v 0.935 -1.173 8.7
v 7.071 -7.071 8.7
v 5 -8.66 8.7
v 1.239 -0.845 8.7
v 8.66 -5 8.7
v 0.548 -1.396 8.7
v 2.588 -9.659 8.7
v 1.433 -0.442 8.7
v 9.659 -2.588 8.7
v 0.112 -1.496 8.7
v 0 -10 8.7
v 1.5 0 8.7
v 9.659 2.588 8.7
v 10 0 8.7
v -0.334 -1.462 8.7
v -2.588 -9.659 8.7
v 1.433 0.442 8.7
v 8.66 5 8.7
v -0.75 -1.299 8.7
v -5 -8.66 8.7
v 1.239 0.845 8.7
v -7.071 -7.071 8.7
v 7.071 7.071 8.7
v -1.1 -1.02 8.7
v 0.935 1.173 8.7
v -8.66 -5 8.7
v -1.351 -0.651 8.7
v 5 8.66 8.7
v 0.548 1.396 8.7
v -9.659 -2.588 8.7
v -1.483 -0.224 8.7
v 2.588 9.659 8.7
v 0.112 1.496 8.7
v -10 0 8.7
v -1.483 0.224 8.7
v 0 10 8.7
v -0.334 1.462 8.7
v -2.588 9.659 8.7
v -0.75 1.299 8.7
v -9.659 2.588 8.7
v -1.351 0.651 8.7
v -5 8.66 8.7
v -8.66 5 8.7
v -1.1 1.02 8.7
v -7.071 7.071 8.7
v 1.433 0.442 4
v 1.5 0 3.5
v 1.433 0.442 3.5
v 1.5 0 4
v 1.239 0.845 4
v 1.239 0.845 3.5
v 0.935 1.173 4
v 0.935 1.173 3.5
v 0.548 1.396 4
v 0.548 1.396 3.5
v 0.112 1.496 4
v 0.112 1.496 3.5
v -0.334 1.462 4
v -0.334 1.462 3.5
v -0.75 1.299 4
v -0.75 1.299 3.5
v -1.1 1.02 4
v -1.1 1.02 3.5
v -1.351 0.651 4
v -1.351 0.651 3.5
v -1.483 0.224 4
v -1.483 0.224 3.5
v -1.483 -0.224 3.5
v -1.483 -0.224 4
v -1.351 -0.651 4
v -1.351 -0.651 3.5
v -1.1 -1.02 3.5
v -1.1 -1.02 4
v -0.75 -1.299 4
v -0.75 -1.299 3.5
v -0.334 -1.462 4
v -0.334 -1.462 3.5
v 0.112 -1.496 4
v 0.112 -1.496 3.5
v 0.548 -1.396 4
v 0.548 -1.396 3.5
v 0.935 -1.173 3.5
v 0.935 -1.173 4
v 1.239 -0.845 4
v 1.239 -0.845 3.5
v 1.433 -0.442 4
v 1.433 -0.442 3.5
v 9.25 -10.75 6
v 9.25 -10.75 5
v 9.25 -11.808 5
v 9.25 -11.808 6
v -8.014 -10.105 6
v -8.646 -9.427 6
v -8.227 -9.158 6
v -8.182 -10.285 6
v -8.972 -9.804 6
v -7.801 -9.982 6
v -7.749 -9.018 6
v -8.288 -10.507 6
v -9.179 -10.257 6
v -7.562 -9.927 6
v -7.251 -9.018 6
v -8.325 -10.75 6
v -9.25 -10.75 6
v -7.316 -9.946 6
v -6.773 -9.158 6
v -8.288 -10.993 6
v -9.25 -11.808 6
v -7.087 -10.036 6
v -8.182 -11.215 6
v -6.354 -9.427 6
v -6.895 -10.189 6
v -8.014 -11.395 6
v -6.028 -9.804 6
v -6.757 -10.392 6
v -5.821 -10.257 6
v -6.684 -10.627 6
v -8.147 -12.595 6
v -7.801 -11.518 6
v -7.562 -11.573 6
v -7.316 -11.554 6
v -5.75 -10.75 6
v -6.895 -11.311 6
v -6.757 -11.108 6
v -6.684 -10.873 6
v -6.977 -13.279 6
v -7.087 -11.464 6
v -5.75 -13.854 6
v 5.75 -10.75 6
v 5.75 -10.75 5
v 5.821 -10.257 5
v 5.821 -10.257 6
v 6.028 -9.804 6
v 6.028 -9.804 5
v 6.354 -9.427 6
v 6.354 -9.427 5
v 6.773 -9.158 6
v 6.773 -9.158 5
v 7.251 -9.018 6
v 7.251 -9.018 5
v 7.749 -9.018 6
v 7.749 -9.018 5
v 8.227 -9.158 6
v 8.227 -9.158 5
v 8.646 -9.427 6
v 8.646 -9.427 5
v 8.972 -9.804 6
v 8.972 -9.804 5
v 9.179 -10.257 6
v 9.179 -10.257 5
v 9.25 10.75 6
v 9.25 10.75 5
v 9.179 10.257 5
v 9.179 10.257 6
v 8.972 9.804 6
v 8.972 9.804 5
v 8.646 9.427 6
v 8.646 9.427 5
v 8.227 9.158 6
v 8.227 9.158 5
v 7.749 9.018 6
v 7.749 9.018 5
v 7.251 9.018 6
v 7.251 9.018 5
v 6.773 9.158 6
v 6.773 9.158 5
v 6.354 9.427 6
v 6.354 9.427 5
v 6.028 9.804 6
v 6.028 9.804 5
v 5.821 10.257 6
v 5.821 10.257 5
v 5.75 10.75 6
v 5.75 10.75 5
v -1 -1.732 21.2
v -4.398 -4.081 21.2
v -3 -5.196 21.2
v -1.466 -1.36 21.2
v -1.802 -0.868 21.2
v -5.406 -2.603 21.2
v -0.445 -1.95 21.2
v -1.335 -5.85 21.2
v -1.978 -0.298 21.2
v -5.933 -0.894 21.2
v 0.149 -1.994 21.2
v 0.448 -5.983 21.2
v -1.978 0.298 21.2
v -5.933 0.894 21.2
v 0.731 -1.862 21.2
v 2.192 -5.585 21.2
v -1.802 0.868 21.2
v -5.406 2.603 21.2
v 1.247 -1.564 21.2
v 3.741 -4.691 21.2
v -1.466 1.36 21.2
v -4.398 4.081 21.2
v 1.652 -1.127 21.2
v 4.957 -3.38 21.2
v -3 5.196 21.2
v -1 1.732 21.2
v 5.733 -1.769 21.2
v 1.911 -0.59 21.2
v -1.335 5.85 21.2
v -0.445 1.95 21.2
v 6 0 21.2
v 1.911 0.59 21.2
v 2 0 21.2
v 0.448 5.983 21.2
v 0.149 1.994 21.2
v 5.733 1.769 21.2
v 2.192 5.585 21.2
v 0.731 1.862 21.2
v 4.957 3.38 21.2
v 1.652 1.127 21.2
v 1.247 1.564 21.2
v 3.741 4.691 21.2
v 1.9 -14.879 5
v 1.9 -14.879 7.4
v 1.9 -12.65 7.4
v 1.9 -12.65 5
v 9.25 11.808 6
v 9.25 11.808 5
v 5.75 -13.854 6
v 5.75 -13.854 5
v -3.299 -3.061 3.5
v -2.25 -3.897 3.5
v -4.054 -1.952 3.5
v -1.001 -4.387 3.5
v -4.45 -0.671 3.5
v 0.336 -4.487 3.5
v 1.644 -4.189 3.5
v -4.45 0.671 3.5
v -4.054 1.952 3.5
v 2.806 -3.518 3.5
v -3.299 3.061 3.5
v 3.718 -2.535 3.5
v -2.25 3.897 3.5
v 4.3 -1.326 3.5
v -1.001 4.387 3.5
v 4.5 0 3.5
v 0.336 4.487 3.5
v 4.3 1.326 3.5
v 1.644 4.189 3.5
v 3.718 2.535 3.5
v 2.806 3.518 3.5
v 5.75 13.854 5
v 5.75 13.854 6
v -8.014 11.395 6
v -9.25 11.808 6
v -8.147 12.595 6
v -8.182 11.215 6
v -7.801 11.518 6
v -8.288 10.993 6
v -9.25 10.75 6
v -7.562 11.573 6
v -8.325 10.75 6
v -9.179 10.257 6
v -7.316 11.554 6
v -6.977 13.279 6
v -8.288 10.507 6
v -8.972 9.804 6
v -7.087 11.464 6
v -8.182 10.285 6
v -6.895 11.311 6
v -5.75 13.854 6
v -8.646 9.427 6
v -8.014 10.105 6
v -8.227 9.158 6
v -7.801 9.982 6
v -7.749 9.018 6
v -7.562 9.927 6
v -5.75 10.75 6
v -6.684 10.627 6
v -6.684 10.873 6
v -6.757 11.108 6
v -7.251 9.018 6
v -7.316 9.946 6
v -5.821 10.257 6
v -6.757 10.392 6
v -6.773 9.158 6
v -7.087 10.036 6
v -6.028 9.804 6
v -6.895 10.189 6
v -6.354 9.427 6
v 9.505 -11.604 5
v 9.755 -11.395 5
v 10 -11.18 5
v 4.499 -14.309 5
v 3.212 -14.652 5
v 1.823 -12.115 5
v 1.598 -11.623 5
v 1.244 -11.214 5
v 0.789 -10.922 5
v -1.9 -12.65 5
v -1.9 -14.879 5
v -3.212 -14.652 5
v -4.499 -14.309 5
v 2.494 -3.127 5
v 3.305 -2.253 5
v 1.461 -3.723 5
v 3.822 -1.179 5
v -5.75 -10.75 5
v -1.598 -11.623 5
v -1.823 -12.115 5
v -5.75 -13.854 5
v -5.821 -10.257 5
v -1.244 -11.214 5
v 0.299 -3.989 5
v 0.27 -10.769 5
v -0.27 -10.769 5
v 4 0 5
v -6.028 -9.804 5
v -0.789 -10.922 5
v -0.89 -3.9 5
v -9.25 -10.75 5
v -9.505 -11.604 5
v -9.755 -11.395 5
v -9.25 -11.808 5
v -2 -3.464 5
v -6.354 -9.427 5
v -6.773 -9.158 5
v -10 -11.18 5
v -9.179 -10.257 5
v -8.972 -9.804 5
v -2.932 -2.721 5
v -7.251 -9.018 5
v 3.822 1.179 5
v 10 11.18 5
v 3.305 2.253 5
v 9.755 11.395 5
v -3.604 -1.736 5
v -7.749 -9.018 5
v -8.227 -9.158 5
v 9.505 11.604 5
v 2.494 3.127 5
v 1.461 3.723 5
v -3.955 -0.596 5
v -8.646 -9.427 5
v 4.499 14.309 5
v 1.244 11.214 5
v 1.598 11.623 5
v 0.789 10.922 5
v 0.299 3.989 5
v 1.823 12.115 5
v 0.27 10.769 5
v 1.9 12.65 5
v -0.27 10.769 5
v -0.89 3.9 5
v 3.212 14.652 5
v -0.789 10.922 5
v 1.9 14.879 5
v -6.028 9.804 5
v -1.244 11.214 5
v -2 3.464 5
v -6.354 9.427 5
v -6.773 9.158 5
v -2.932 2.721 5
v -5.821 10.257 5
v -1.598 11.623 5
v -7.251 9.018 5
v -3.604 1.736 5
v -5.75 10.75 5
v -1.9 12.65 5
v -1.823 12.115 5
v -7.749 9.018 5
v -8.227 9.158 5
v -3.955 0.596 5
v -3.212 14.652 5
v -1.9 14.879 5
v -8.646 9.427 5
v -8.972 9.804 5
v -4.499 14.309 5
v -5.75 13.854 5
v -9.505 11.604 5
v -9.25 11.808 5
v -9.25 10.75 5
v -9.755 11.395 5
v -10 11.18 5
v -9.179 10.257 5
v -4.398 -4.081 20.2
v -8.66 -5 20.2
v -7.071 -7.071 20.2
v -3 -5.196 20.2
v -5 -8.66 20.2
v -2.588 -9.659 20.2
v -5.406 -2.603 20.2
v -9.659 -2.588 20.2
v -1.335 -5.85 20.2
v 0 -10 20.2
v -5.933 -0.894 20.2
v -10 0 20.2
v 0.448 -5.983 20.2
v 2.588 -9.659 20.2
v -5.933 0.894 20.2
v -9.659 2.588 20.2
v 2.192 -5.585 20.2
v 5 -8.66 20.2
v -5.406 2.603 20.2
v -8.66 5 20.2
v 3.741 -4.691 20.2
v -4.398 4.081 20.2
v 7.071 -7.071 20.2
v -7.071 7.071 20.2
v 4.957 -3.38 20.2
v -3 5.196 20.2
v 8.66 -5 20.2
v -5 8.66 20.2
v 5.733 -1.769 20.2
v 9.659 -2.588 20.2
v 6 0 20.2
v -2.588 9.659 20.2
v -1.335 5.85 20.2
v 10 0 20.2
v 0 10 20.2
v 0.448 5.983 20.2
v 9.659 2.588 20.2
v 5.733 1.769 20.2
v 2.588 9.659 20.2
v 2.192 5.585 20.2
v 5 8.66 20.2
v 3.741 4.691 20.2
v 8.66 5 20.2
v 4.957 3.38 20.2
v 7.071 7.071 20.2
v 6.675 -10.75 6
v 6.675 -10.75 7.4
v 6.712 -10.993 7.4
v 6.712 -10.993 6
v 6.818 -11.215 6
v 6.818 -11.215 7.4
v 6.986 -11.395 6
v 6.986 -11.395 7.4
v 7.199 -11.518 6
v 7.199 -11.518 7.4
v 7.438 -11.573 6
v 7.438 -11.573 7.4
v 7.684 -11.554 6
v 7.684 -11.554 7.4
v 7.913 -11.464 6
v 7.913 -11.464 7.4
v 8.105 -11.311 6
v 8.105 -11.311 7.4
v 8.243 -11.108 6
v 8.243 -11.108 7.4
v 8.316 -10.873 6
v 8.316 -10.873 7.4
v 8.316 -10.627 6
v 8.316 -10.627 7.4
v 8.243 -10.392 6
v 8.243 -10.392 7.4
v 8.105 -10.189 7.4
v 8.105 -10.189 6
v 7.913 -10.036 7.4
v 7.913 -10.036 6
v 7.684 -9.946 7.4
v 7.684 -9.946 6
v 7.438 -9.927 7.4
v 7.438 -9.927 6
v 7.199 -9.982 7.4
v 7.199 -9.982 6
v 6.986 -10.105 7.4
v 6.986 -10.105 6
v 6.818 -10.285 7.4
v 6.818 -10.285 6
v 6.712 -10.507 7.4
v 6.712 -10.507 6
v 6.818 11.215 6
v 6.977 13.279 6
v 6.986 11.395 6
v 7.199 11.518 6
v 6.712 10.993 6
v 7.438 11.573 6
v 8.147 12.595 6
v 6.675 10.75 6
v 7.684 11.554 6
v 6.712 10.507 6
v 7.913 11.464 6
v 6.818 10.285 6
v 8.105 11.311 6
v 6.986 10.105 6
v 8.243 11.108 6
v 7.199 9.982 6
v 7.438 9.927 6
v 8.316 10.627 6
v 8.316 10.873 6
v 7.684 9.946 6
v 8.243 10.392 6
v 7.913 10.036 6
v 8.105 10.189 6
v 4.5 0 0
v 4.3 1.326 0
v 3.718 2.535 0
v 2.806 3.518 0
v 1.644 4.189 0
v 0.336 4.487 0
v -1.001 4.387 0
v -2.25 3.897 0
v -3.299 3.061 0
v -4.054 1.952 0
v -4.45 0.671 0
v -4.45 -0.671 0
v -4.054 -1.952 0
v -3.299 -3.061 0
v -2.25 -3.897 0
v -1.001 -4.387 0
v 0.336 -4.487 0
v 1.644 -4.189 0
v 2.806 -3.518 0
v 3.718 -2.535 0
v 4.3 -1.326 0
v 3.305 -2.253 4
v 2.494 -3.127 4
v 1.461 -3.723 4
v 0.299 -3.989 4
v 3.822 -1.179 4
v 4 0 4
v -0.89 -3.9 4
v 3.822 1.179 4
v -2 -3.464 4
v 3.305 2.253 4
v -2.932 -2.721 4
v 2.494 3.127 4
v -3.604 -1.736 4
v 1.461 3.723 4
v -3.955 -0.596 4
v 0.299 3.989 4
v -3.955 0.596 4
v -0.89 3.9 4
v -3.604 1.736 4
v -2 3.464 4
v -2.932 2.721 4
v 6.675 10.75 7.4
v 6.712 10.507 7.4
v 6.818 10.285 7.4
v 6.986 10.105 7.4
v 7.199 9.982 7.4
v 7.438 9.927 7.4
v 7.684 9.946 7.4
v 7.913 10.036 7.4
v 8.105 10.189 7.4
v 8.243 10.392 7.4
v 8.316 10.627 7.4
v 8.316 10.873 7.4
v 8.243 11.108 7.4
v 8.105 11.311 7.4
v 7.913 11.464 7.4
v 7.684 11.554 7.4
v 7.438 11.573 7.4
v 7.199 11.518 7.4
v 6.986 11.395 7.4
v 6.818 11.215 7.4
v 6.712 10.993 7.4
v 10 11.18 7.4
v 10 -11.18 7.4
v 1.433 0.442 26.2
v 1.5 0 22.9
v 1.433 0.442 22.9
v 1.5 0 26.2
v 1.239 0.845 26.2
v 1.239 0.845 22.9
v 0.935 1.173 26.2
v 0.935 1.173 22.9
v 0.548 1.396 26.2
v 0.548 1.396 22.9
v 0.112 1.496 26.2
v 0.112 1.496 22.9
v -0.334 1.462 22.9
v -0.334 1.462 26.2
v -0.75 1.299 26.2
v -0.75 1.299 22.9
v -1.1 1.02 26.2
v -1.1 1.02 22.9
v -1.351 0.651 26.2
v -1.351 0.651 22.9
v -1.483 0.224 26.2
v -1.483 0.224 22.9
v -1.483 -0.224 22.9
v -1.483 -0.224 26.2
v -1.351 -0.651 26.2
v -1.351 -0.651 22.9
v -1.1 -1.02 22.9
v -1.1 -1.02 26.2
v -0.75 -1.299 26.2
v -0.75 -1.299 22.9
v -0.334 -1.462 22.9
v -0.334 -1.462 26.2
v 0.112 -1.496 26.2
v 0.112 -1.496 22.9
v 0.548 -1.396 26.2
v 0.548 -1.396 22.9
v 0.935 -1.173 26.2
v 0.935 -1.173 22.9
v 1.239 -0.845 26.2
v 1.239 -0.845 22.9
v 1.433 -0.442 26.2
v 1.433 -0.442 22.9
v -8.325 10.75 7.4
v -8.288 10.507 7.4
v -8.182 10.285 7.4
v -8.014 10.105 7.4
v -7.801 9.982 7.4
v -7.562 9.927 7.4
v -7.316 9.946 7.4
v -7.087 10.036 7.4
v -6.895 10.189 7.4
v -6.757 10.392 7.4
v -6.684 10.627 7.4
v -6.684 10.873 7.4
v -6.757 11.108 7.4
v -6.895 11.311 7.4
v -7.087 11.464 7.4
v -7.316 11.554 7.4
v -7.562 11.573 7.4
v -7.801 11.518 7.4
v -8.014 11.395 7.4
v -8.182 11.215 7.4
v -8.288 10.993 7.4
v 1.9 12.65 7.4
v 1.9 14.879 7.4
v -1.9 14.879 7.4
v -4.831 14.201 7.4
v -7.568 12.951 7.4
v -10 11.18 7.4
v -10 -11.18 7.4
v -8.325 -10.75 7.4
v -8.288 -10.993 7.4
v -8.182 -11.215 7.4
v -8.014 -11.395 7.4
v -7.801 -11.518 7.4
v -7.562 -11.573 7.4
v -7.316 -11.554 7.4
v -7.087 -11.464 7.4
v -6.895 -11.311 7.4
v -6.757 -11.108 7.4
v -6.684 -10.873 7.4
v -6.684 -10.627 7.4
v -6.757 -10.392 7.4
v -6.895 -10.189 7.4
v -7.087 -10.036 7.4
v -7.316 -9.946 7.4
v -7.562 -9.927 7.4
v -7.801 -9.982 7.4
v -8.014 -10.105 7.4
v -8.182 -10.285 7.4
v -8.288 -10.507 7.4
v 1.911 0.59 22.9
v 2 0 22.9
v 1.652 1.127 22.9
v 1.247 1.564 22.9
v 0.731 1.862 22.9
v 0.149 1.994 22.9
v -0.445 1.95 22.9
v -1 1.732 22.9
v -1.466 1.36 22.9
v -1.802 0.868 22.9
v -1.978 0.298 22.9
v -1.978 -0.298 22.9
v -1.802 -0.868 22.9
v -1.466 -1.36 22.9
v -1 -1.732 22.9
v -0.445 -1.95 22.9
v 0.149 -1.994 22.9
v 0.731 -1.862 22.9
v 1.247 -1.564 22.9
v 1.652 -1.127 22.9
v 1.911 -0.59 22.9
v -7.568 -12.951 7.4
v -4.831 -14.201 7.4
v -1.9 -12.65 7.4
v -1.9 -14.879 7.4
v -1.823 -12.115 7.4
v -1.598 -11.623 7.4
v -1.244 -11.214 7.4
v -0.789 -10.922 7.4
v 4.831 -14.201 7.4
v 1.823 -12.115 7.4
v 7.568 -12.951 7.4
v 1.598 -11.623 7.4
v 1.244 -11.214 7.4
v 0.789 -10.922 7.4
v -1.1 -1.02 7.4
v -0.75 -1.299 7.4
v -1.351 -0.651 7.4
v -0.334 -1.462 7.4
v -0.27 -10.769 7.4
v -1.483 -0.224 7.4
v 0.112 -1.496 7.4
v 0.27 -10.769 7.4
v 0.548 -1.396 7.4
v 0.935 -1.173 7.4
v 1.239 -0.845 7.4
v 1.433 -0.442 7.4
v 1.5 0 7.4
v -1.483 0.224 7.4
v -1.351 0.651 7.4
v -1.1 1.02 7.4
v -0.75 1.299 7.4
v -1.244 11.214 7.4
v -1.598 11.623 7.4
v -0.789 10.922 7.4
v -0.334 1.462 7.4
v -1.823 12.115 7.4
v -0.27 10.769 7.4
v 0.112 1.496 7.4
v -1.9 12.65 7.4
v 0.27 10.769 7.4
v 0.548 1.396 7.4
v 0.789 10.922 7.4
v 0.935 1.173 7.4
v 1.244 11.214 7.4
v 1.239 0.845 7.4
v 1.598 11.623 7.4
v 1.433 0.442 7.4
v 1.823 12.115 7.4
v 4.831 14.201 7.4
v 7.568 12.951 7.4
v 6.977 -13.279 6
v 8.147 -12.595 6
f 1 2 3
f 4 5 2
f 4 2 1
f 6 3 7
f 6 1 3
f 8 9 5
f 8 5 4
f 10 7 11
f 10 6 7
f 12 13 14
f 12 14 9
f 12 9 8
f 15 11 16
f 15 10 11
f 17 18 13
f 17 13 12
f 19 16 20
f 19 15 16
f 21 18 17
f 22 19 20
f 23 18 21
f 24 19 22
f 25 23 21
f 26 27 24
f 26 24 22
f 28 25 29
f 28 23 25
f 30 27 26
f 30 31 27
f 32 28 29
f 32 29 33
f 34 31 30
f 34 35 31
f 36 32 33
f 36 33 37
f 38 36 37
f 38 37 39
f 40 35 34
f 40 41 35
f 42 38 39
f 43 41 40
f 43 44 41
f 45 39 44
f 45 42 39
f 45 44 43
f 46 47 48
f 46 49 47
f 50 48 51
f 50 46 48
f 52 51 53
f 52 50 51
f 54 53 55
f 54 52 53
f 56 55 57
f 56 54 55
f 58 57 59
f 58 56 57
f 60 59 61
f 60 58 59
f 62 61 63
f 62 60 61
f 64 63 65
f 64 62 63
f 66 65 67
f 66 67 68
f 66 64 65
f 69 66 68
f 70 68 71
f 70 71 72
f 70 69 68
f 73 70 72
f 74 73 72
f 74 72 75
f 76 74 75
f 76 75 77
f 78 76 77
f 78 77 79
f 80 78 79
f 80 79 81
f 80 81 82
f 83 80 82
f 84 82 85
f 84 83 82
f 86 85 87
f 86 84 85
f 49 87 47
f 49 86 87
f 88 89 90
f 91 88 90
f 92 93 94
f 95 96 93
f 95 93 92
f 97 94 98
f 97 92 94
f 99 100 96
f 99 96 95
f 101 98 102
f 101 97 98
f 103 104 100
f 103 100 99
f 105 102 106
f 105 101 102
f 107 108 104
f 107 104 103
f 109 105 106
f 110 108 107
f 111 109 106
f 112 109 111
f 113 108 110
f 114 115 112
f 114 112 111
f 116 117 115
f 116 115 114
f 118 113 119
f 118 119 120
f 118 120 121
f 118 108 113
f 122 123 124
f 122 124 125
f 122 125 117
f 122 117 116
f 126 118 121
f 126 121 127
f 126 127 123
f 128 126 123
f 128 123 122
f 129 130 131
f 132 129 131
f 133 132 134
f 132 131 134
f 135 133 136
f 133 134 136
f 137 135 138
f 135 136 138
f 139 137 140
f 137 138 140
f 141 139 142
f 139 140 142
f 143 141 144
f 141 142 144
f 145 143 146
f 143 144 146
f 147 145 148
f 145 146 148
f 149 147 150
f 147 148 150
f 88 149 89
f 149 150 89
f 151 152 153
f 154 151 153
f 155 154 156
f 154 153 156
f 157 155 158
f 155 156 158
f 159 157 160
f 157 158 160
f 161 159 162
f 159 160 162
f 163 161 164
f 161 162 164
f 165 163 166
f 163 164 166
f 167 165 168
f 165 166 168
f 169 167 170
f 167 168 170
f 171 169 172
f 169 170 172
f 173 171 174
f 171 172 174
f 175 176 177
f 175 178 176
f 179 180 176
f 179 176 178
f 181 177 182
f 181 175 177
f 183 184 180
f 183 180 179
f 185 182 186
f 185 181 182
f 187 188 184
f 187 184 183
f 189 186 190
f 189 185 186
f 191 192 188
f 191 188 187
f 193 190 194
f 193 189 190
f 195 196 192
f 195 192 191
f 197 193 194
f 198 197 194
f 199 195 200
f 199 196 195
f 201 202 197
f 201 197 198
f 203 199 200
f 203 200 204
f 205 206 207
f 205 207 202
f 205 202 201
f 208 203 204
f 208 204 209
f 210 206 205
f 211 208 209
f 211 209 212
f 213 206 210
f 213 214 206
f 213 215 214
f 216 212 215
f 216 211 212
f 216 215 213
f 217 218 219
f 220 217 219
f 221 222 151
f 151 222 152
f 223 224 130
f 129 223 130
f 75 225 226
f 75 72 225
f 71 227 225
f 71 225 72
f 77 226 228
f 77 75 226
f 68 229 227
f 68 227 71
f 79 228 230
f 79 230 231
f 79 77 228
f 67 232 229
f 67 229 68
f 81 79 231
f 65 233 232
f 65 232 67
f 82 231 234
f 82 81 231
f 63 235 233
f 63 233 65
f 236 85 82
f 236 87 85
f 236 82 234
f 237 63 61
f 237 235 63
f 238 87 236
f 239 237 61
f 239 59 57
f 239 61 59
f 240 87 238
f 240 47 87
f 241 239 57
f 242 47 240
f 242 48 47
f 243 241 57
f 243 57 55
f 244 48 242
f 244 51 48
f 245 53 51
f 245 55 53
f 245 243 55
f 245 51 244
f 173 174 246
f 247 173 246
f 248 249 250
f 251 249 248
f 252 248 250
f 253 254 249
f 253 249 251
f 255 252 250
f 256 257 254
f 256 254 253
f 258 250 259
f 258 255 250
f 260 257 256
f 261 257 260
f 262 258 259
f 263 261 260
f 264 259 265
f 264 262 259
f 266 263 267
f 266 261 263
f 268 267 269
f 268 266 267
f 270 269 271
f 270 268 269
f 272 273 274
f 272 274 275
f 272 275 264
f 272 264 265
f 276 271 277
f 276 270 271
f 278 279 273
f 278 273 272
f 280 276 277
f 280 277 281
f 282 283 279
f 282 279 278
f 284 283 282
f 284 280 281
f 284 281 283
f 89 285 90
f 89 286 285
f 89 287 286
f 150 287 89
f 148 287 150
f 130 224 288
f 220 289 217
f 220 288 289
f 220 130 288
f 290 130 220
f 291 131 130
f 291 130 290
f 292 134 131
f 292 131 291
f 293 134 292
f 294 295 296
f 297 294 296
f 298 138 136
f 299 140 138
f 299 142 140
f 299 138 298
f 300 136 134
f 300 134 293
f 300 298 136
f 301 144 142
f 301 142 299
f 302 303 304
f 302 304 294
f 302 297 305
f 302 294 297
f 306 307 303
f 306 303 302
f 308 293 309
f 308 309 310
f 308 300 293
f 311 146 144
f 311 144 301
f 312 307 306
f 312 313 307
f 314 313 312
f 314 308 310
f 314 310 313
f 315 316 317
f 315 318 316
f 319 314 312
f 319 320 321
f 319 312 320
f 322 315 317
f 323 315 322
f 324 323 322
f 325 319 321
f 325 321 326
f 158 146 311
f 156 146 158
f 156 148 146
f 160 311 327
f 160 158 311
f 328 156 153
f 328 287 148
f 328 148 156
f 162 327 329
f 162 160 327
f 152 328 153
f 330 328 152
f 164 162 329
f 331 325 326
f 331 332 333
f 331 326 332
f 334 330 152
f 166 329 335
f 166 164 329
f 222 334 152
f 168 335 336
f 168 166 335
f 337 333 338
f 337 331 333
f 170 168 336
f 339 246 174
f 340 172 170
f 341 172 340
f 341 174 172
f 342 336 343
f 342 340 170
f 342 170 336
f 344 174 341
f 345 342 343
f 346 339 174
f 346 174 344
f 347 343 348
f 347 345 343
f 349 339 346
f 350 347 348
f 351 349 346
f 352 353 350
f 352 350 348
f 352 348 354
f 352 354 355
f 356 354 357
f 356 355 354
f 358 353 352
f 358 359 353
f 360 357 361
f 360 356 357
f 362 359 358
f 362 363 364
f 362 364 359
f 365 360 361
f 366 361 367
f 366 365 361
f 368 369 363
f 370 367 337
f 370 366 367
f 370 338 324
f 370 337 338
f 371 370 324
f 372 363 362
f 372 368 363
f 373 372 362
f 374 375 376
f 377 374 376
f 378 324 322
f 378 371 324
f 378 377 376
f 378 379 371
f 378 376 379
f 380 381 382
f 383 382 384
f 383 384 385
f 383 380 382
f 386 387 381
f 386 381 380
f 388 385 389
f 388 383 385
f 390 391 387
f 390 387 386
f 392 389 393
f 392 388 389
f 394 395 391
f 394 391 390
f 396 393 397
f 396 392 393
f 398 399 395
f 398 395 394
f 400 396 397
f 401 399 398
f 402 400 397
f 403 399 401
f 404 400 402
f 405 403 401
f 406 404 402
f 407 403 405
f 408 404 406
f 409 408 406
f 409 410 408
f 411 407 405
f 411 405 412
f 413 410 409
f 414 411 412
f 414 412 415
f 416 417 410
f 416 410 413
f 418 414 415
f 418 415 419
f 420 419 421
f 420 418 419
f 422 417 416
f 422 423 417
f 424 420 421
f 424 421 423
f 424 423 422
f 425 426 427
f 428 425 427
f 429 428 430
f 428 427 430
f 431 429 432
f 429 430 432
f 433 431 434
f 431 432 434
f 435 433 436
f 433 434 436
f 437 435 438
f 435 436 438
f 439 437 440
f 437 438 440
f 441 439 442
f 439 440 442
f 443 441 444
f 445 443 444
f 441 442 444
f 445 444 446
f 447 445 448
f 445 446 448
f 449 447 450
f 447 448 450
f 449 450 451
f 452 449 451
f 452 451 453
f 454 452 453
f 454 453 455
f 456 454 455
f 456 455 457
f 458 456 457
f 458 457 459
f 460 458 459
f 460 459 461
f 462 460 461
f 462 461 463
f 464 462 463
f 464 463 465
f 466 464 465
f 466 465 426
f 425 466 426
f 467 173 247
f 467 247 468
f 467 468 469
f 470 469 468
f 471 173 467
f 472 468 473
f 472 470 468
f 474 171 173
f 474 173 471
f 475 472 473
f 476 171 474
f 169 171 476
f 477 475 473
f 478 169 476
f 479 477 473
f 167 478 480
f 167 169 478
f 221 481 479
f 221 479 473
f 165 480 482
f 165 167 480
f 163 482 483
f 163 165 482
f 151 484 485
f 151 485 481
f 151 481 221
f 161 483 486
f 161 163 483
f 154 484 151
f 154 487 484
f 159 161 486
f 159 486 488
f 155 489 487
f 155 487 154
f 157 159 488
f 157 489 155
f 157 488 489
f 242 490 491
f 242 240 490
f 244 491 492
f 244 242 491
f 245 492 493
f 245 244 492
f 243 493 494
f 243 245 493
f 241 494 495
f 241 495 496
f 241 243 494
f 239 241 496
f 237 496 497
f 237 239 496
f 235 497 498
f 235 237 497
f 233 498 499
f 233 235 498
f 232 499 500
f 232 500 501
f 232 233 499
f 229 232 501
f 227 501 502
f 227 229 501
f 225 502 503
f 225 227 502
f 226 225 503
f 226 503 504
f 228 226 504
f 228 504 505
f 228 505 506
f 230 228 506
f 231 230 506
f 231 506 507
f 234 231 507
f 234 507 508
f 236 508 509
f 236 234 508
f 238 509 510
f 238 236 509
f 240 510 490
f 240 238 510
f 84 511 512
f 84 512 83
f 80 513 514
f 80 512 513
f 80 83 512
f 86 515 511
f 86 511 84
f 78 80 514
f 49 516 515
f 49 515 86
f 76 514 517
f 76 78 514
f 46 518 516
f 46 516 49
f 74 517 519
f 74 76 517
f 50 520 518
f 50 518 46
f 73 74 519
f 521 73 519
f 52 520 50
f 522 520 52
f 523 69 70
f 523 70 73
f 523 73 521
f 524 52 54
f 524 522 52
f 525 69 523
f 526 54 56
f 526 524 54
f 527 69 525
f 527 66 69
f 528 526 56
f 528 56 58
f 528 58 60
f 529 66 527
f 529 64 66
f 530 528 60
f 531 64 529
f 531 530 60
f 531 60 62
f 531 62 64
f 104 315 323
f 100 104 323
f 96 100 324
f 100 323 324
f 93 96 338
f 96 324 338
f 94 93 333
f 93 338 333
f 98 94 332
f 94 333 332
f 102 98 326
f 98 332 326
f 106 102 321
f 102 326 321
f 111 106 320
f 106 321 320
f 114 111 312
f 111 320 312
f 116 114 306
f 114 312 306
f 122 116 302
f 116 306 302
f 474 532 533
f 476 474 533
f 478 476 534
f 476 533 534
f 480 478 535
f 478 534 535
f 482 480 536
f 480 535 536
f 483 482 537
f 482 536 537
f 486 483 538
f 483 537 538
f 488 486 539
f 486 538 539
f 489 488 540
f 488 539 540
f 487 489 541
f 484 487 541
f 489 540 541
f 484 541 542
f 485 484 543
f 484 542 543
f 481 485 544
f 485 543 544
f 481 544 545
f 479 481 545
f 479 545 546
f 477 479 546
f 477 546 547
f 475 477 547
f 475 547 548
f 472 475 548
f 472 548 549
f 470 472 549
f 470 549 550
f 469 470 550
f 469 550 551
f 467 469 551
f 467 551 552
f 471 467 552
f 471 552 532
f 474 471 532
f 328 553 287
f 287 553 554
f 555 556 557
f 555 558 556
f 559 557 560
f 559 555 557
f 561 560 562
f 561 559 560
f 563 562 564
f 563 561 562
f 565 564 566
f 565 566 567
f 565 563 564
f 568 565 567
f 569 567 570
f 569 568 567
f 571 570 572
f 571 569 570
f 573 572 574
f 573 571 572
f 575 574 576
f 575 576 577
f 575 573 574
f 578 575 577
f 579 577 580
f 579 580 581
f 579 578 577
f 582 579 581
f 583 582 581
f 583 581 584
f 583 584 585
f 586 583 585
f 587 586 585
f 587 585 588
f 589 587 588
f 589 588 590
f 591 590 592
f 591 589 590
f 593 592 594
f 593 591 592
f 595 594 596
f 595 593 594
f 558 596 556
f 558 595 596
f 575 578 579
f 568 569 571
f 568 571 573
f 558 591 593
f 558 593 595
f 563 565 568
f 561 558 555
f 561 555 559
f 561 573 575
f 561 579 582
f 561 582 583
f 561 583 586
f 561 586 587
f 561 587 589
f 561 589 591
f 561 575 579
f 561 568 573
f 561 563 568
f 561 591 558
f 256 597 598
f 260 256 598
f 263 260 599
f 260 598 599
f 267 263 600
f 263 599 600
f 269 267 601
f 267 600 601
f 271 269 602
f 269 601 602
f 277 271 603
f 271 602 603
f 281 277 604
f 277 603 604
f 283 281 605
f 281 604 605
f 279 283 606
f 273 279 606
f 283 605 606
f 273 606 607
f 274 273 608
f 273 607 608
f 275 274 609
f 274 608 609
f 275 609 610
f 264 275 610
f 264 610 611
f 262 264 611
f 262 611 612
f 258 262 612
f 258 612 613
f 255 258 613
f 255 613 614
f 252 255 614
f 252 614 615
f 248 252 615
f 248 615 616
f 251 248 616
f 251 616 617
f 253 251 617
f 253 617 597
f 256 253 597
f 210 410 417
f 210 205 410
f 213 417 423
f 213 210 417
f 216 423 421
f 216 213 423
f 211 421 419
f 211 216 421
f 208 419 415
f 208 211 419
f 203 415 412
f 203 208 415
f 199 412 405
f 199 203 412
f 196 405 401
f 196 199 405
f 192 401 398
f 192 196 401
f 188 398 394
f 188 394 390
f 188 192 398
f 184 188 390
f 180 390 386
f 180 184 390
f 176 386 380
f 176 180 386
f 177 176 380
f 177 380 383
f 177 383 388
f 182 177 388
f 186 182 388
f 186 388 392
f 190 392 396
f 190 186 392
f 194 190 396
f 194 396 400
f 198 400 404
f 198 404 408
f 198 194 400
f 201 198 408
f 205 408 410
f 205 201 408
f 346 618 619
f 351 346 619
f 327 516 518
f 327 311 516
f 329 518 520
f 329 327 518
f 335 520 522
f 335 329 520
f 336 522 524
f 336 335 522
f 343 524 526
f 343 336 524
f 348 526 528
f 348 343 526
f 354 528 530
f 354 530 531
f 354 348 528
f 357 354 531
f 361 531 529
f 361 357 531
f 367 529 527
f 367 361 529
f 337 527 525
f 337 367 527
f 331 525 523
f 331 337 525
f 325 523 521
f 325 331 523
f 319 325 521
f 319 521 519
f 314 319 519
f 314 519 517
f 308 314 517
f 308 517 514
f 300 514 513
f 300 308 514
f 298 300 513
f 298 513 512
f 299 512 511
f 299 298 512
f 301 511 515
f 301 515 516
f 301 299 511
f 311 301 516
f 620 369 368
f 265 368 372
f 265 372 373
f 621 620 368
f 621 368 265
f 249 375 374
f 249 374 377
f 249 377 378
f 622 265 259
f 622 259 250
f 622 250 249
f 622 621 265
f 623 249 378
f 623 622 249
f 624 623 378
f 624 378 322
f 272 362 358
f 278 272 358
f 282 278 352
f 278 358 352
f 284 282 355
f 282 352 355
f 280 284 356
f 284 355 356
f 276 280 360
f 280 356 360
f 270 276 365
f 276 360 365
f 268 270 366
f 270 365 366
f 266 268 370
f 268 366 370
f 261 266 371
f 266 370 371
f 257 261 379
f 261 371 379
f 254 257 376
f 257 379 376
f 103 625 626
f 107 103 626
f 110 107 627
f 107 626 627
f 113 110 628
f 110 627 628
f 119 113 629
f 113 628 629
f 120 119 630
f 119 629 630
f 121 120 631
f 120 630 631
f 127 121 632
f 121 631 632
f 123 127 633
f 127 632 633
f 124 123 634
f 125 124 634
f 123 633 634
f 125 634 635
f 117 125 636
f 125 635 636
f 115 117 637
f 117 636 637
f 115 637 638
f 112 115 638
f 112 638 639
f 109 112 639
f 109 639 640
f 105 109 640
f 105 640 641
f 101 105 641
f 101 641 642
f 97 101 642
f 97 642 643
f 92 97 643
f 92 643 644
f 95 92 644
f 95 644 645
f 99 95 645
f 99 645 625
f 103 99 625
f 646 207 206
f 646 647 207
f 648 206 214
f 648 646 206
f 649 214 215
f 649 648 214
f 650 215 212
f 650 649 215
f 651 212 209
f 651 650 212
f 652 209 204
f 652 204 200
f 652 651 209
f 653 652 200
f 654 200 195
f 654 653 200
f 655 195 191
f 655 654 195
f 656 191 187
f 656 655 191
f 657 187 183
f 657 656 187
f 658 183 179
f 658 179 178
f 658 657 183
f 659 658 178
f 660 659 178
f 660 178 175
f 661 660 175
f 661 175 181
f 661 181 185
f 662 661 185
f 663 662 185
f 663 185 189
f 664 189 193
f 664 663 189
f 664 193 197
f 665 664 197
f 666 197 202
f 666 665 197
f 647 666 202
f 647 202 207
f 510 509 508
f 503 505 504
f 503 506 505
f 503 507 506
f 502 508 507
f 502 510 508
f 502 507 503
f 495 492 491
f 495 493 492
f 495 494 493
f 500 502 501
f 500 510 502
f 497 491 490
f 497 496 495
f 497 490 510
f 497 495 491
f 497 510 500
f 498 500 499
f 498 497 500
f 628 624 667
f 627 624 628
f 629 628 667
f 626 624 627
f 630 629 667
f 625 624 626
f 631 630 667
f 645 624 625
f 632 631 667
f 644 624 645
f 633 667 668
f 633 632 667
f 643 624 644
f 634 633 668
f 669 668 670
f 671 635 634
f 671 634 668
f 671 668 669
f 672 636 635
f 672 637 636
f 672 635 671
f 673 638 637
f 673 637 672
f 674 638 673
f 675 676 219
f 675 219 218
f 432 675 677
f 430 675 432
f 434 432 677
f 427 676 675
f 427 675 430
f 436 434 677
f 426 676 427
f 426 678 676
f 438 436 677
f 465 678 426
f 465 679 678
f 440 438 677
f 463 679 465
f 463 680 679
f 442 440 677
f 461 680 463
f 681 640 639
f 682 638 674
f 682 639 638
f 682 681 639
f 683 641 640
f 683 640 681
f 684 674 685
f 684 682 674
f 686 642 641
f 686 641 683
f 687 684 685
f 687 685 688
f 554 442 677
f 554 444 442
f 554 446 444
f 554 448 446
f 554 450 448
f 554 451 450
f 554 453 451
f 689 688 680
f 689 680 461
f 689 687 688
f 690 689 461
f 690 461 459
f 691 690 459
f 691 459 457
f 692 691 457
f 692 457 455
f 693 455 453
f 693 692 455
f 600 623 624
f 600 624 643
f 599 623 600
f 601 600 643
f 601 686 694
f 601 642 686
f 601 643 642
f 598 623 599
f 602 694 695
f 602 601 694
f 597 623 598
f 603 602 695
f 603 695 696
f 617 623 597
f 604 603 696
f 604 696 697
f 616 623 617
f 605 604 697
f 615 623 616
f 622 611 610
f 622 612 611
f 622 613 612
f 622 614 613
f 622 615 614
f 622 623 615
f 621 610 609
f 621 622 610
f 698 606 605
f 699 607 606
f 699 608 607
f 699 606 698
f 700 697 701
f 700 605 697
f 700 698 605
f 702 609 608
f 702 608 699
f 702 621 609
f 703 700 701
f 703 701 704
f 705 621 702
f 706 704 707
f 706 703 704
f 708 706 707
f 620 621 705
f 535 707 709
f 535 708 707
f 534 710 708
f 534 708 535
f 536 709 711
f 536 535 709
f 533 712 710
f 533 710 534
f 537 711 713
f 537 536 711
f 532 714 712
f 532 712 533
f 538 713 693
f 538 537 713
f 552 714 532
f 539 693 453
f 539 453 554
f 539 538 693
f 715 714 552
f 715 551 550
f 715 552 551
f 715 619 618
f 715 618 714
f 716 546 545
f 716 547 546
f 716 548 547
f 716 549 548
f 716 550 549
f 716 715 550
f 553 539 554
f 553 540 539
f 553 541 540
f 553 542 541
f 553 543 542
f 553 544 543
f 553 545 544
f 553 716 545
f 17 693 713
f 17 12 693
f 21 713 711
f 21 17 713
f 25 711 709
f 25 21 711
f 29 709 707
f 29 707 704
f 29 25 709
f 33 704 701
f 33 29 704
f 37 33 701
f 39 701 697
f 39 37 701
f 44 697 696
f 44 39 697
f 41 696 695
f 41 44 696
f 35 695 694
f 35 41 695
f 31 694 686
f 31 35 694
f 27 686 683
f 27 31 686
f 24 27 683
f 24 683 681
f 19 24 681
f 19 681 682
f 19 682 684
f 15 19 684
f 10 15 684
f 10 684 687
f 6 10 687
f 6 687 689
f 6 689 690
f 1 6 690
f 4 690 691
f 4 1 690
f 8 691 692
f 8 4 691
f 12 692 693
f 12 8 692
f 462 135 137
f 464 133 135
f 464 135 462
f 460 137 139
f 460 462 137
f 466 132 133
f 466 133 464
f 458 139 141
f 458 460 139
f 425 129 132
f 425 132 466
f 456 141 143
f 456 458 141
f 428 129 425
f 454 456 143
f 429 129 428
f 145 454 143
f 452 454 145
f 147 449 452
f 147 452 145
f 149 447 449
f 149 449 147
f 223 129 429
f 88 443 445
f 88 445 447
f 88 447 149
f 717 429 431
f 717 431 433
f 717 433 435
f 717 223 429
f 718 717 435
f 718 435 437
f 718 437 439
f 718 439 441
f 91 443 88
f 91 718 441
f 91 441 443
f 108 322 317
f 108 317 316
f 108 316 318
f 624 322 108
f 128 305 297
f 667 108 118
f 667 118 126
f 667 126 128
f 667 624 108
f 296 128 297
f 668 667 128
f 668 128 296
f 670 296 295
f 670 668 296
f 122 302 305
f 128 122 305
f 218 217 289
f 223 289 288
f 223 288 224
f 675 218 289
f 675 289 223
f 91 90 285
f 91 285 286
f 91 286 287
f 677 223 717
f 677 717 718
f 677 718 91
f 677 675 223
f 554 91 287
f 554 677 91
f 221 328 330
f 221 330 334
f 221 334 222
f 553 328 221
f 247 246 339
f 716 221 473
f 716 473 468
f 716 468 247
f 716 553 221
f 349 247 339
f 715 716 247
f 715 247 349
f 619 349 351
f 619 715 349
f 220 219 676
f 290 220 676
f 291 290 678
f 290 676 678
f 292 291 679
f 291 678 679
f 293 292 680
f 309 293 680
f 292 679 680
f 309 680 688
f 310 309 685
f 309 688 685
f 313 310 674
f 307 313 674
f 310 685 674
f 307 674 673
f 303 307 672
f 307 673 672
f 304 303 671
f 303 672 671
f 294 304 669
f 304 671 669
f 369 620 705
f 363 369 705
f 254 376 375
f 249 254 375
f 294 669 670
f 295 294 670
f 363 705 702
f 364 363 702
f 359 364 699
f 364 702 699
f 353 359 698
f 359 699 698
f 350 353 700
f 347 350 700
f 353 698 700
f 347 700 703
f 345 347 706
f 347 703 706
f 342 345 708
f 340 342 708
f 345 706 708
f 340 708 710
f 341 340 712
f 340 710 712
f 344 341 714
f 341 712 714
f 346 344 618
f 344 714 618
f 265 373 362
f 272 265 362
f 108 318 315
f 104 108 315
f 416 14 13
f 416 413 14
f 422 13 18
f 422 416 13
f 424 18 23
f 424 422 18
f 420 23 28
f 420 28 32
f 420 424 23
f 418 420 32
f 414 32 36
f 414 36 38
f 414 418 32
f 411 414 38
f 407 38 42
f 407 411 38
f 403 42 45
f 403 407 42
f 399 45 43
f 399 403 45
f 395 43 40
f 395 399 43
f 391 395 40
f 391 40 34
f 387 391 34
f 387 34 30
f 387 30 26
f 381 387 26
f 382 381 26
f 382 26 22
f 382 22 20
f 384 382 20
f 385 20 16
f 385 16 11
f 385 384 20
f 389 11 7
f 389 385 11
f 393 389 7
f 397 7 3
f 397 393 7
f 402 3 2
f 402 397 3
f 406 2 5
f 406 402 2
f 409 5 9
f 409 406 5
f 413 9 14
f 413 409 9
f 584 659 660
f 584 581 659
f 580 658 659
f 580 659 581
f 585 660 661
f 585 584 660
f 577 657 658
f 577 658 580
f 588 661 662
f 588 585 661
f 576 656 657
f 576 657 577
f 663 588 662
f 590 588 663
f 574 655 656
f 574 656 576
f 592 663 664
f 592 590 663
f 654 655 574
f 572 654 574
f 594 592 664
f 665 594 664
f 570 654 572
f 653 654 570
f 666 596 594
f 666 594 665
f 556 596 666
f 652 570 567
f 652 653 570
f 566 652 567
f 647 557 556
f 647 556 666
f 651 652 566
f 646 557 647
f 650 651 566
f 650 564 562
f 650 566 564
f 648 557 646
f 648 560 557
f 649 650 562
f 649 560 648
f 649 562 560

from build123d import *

# Parameters (mm, degrees)
SKETCH001_W     = 14.830339
SKETCH001_H     = 37.894496
SKETCH001_W_2   = 11.332046
SKETCH001_H_2   = 38.12416
POCKET_DEPTH    = 7.401
SKETCH002_R     = 0.825
POCKET001_DEPTH = 7.401
POCKET002_DEPTH = 1


with BuildPart() as part:
    # Sketch → Revolution (revolve)
    with BuildSketch(Plane.XZ):
        Polygon((0, 0), (4.5, 0), (4.5, 3.5), (1.5, 3.5), (1.5, 4), (4, 4), (4, 5), (15, 5), (15, 7.4), (1.5, 7.4), (1.5, 8.7), (10, 8.7), (10, 20.2), (6, 20.2), (6, 21.2), (2, 21.2), (2, 22.9), (1.5, 22.9), (1.5, 26.2), (0, 26.2), align=None)
    revolve(axis=Axis((0, 0, 0), (0, 0, 1)))

    # Sketch001 (on Face9 of Revolution) → Pocket (cut, through all)
    with BuildSketch(Plane(origin=(0, 0, 7.4), x_dir=(-1, 0, 0), z_dir=(0, 0, 1))):
        with Locations((-17.415169, -0.751627)):
            Rectangle(SKETCH001_W, SKETCH001_H)
        with Locations((15.666023, -0.866459)):
            Rectangle(SKETCH001_W_2, SKETCH001_H_2)
    extrude(amount=-POCKET_DEPTH, mode=Mode.SUBTRACT)

    # Sketch002 (on Face12 of Pocket) → Pocket001 (cut, through all)
    with BuildSketch(Plane(origin=(0, 0, 7.4), x_dir=(-1, 0, 0), z_dir=(0, 0, 1))):
        with Locations((-7.5, 10.75)):
            Circle(SKETCH002_R)
        with Locations((7.5, 10.75)):
            Circle(SKETCH002_R)
        with Locations((7.5, -10.75)):
            Circle(SKETCH002_R)
        with Locations((-7.5, -10.75)):
            Circle(SKETCH002_R)
        with BuildLine():
            ThreePointArc((1.9, 17.255435), (0, 19.155435), (-1.9, 17.255435))
            Line((-1.9, 17.255435), (-1.9, 12.65))
            ThreePointArc((-1.9, 12.65), (0, 10.75), (1.9, 12.65))
            Line((1.9, 12.65), (1.9, 17.255435))
        make_face()
        with BuildLine():
            ThreePointArc((-1.9, -16.247692), (0, -18.147692), (1.9, -16.247692))
            Line((1.9, -16.247692), (1.9, -12.65))
            ThreePointArc((1.9, -12.65), (0, -10.75), (-1.9, -12.65))
            Line((-1.9, -12.65), (-1.9, -16.247692))
        make_face()
    extrude(amount=-POCKET001_DEPTH, mode=Mode.SUBTRACT)

    # Sketch003 (on Face7 of Pocket001) → Pocket002 (cut)
    with BuildSketch(Plane(origin=(0, 0, 5), x_dir=(1, 0, 0), z_dir=(0, 0, -1))):
        with BuildLine():
            ThreePointArc((-5.75, 14.896887), (-7.5, 16.646887), (-9.25, 14.896887))
            Line((-9.25, 14.896887), (-9.25, 10.75))
            ThreePointArc((-9.25, 10.75), (-7.5, 9), (-5.75, 10.75))
            Line((-5.75, 10.75), (-5.75, 14.896887))
        make_face()
        with BuildLine():
            ThreePointArc((9.25, 14.479509), (7.5, 16.229509), (5.75, 14.479509))
            Line((5.75, 14.479509), (5.75, 10.75))
            ThreePointArc((5.75, 10.75), (7.5, 9), (9.25, 10.75))
            Line((9.25, 10.75), (9.25, 14.479509))
        make_face()
        with BuildLine():
            ThreePointArc((5.75, -14.269869), (7.5, -16.019869), (9.25, -14.269869))
            Line((9.25, -14.269869), (9.25, -10.75))
            ThreePointArc((9.25, -10.75), (7.5, -9), (5.75, -10.75))
            Line((5.75, -10.75), (5.75, -14.269869))
        make_face()
        with BuildLine():
            ThreePointArc((-9.25, -14.048632), (-7.5, -15.798632), (-5.75, -14.048632))
            Line((-5.75, -14.048632), (-5.75, -10.75))
            ThreePointArc((-5.75, -10.75), (-7.5, -9), (-9.25, -10.75))
            Line((-9.25, -10.75), (-9.25, -14.048632))
        make_face()
    extrude(amount=-POCKET002_DEPTH, mode=Mode.SUBTRACT)


solid = part.part
